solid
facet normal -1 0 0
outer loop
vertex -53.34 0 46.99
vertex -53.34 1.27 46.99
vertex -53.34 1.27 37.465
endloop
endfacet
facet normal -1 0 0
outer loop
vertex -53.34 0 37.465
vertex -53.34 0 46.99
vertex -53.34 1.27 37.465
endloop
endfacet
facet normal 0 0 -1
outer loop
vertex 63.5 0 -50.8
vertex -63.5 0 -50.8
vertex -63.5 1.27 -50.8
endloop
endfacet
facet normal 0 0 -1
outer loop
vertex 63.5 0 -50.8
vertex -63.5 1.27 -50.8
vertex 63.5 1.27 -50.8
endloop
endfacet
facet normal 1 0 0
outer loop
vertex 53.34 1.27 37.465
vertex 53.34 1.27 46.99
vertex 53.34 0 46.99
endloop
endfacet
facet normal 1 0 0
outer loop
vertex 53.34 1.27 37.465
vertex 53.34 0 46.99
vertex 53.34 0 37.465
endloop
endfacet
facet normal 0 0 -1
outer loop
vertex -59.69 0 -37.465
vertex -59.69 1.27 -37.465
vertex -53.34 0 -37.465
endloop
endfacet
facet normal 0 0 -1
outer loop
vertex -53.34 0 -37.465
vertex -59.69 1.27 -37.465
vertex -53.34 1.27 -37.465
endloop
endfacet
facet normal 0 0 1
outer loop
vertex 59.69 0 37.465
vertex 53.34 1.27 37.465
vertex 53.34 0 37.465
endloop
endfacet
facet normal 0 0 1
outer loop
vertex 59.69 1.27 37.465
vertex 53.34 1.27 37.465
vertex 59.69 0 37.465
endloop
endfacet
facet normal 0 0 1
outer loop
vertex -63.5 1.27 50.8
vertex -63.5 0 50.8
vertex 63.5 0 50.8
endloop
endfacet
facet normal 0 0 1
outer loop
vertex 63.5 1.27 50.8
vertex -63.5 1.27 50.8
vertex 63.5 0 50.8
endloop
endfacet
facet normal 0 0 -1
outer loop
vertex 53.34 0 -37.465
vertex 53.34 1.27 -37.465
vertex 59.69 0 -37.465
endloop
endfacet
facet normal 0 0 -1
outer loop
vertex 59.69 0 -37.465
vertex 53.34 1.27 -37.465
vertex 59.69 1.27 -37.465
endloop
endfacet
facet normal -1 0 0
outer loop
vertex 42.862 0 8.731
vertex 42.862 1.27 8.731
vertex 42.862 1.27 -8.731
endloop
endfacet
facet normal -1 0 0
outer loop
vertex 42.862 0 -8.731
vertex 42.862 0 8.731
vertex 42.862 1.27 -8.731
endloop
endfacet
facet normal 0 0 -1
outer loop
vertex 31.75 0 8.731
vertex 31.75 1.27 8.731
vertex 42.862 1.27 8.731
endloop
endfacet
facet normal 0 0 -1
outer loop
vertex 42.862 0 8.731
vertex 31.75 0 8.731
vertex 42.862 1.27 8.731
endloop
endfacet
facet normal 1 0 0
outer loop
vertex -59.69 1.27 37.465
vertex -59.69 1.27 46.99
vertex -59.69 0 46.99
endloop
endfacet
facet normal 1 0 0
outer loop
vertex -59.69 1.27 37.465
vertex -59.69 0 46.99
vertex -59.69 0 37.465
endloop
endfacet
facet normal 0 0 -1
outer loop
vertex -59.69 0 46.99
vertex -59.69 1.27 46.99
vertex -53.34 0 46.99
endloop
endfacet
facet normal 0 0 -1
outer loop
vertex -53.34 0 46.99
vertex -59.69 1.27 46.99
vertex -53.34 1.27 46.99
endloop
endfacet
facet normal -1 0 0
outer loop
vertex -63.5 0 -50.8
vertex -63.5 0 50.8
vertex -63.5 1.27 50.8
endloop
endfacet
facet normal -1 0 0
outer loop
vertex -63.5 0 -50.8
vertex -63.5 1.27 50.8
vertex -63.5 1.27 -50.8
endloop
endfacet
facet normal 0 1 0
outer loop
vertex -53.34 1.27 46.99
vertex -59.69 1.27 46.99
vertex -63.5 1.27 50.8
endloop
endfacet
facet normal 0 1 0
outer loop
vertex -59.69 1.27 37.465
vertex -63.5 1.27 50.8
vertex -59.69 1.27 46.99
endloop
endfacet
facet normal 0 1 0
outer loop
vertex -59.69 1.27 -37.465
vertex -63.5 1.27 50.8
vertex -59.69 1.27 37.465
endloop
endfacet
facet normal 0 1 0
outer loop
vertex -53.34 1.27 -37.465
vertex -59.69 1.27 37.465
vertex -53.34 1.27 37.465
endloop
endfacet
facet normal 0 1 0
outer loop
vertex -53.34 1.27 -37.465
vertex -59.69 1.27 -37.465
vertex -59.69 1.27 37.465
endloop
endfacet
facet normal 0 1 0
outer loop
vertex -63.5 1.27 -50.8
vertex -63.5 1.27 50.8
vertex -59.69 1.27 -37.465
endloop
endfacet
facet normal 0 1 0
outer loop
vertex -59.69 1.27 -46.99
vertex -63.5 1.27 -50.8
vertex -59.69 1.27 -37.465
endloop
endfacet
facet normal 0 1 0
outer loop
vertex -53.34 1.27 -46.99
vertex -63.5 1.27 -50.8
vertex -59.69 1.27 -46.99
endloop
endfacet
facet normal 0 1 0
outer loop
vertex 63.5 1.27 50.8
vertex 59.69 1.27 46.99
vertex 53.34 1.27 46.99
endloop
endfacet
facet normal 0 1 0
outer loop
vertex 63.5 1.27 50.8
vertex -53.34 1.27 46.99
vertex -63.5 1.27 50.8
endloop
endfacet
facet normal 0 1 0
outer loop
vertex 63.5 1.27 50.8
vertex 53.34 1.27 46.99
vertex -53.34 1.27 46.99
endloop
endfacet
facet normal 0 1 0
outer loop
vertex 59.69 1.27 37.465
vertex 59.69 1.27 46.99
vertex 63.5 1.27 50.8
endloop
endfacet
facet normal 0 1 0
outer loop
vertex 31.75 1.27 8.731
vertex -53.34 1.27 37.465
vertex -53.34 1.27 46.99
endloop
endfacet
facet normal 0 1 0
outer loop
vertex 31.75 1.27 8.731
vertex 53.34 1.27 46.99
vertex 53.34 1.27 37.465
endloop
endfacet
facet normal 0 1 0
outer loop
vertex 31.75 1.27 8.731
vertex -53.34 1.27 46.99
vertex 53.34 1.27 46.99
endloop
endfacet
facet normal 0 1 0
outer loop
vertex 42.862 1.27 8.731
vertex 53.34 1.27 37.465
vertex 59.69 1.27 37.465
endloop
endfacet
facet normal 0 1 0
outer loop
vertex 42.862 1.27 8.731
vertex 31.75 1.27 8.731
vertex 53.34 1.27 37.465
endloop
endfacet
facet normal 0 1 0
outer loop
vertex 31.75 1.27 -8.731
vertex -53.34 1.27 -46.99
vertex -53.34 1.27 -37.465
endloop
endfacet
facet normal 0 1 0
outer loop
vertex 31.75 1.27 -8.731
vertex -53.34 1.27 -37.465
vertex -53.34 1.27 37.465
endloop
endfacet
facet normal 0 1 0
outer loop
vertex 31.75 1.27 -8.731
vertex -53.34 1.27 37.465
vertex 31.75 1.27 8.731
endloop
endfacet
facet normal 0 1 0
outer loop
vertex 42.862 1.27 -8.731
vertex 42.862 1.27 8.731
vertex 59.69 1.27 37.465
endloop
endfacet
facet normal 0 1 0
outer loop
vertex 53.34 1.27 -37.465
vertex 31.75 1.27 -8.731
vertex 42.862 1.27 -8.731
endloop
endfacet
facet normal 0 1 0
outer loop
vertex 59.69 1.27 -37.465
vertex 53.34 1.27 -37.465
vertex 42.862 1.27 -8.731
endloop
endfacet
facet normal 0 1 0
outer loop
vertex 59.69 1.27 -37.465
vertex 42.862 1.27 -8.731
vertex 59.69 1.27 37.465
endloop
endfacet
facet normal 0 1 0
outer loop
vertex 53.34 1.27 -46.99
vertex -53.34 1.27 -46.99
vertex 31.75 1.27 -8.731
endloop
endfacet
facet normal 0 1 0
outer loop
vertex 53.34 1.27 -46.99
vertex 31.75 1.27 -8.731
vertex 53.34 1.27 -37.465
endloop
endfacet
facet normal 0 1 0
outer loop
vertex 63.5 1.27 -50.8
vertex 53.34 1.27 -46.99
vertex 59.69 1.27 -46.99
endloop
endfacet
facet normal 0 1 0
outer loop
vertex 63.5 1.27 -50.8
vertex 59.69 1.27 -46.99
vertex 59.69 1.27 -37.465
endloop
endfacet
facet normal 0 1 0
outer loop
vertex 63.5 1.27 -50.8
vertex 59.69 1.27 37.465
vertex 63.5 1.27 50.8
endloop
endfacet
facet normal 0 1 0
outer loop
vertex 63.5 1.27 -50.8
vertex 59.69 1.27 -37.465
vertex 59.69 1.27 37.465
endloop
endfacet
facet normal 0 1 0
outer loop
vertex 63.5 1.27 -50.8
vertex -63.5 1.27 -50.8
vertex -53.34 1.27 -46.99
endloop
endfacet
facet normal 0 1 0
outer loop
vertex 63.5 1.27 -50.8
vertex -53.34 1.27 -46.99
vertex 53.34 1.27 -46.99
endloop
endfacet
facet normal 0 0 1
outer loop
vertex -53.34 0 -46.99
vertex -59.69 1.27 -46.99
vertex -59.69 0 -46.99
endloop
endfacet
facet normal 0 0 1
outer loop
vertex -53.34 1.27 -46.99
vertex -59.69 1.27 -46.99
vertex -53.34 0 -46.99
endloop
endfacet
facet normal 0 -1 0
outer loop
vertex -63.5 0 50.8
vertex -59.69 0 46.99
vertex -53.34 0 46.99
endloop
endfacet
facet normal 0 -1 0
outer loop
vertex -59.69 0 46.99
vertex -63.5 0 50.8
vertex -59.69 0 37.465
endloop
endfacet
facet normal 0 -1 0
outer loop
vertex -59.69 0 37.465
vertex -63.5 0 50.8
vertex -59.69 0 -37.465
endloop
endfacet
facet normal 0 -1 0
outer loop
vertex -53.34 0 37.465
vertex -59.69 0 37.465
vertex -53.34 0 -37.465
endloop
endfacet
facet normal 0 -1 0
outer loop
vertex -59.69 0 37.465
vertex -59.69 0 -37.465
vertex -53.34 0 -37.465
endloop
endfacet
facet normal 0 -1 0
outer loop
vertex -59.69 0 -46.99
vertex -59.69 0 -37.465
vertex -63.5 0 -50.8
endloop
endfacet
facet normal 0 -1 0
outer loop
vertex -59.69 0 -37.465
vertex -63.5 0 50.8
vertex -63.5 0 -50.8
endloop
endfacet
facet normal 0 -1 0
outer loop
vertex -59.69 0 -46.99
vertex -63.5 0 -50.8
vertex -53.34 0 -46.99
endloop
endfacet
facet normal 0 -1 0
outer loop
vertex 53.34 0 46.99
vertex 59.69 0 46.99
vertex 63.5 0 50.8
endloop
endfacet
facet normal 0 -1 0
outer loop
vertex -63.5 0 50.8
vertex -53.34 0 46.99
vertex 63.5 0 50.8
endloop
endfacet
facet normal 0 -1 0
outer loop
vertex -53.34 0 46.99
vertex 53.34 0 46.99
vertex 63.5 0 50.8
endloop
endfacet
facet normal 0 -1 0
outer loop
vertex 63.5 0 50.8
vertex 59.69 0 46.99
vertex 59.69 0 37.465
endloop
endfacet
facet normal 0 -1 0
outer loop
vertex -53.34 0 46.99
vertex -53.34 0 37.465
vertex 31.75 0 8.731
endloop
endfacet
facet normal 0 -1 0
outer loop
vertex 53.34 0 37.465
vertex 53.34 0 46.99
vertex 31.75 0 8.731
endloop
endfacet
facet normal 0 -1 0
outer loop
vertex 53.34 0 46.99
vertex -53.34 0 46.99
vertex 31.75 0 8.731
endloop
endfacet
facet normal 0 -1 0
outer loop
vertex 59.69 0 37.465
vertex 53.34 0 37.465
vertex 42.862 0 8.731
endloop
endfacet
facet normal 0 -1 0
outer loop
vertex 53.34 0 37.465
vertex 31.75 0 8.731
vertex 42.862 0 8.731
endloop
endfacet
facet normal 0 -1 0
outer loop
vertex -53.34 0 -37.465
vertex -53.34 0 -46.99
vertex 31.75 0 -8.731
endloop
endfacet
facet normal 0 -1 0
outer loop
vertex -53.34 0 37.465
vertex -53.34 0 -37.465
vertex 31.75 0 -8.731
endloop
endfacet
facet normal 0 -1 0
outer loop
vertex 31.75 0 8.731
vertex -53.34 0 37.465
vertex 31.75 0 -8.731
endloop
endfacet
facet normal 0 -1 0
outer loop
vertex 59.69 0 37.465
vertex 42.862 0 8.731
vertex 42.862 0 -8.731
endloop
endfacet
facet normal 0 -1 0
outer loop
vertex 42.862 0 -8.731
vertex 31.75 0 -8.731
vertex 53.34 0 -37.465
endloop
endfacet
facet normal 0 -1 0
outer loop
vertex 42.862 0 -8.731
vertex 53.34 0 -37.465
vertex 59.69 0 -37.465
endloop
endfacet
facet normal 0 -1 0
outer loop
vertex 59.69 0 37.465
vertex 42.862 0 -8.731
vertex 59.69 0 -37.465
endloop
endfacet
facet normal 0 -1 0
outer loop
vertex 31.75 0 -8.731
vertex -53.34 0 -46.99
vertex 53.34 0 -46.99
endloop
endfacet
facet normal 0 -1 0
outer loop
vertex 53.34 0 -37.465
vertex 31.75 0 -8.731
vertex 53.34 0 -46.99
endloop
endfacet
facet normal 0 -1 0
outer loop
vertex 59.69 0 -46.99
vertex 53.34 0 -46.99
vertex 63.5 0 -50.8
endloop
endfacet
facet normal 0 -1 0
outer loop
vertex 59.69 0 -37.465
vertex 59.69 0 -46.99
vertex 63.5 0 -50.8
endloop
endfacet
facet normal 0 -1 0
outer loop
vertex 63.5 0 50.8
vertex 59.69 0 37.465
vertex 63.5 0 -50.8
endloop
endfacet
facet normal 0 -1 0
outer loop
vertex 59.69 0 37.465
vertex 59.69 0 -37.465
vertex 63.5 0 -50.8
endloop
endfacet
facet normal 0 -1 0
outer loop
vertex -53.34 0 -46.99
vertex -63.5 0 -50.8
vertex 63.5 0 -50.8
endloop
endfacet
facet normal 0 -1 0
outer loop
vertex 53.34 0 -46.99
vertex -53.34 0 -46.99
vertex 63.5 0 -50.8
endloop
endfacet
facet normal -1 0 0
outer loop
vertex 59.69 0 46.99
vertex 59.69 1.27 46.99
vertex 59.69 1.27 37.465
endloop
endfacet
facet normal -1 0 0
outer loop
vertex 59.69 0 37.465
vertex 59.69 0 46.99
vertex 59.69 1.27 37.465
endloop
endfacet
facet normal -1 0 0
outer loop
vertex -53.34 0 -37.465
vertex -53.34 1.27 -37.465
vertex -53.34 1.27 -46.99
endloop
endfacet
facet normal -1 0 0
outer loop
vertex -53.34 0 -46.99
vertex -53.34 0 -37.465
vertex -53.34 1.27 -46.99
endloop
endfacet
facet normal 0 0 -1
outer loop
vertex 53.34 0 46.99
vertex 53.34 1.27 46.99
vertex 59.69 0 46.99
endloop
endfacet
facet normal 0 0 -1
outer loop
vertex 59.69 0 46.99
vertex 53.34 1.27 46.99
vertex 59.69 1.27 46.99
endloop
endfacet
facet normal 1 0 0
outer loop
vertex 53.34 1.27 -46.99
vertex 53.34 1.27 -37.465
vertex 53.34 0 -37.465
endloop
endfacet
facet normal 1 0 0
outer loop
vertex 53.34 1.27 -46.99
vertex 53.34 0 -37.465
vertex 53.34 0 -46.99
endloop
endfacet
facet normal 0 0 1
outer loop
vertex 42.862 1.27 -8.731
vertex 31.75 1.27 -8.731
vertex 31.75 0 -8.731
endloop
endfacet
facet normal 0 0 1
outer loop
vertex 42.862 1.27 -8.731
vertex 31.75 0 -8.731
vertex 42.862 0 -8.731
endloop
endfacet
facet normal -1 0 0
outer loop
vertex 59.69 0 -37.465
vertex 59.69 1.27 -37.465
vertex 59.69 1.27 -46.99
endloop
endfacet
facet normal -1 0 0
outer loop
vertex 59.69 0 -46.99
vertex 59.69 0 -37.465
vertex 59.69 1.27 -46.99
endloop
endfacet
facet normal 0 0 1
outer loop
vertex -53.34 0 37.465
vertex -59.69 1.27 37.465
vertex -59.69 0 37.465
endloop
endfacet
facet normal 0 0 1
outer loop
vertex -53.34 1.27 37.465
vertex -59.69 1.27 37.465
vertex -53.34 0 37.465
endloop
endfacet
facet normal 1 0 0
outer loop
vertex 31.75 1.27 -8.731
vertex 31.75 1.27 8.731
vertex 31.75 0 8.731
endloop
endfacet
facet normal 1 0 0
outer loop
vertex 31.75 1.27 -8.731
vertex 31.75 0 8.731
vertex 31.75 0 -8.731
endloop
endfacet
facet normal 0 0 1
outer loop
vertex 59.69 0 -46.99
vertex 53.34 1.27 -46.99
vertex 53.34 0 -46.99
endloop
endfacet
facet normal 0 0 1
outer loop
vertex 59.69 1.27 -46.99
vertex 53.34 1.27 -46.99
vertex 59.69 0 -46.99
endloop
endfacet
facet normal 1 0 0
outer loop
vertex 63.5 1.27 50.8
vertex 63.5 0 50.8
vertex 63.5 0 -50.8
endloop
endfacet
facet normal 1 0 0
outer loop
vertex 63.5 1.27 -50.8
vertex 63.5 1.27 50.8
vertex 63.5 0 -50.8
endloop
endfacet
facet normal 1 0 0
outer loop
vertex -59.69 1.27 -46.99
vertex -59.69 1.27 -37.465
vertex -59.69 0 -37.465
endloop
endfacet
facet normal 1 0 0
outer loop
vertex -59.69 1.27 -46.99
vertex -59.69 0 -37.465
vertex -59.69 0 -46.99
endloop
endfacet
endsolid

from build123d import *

# Parameters (mm, degrees)
SKETCH1_W           = 127
SKETCH1_H           = 101.6
BOSS_EXTRUDE1_DEPTH = 1.27
CUT_EXTRUDE1_REACH  = 83.33
SKETCH2_W           = 6.35
SKETCH2_H           = 9.525
CUT_EXTRUDE2_REACH  = 83.33
SKETCH3_W           = 11.1125
SKETCH3_H           = 17.4625


with BuildPart() as part:
    # Sketch1 → Boss-Extrude1 (new body)
    with BuildSketch(Plane(origin=(0, 0, 0), x_dir=(1, 0, 0), z_dir=(0, 1, 0))):
        Rectangle(SKETCH1_W, SKETCH1_H)
    extrude(amount=BOSS_EXTRUDE1_DEPTH)

    # Sketch2 → Cut-Extrude1 (cut, up to next)
    with BuildSketch(Plane(origin=(0, 1.27, 0), x_dir=(1, 0, 0), z_dir=(0, 1, 0)), mode=Mode.PRIVATE) as cut_extrude1_sk1:
        with Locations((-56.515, 42.2275)):
            Rectangle(SKETCH2_W, SKETCH2_H)
    cut_extrude1_tool1 = extrude(cut_extrude1_sk1.sketch, amount=-CUT_EXTRUDE1_REACH, mode=Mode.PRIVATE) & part.part
    # Sketch2 → Cut-Extrude1 (cut, up to next)
    with BuildSketch(Plane(origin=(0, 1.27, 0), x_dir=(1, 0, 0), z_dir=(0, 1, 0)), mode=Mode.PRIVATE) as cut_extrude1_sk2:
        with Locations((56.515, 42.2275)):
            Rectangle(SKETCH2_W, SKETCH2_H)
    cut_extrude1_tool2 = extrude(cut_extrude1_sk2.sketch, amount=-CUT_EXTRUDE1_REACH, mode=Mode.PRIVATE) & part.part
    # Sketch2 → Cut-Extrude1 (cut, up to next)
    with BuildSketch(Plane(origin=(0, 1.27, 0), x_dir=(1, 0, 0), z_dir=(0, 1, 0)), mode=Mode.PRIVATE) as cut_extrude1_sk3:
        with Locations((56.515, -42.2275)):
            Rectangle(SKETCH2_W, SKETCH2_H)
    cut_extrude1_tool3 = extrude(cut_extrude1_sk3.sketch, amount=-CUT_EXTRUDE1_REACH, mode=Mode.PRIVATE) & part.part
    # Sketch2 → Cut-Extrude1 (cut, up to next)
    with BuildSketch(Plane(origin=(0, 1.27, 0), x_dir=(1, 0, 0), z_dir=(0, 1, 0)), mode=Mode.PRIVATE) as cut_extrude1_sk4:
        with Locations((-56.515, -42.2275)):
            Rectangle(SKETCH2_W, SKETCH2_H)
    cut_extrude1_tool4 = extrude(cut_extrude1_sk4.sketch, amount=-CUT_EXTRUDE1_REACH, mode=Mode.PRIVATE) & part.part
    add(cut_extrude1_tool1.solids().sort_by_distance((-56.515, 1.27, -42.2275))[0], mode=Mode.SUBTRACT)
    add(cut_extrude1_tool2.solids().sort_by_distance((56.515, 1.27, -42.2275))[0], mode=Mode.SUBTRACT)
    add(cut_extrude1_tool3.solids().sort_by_distance((56.515, 1.27, 42.2275))[0], mode=Mode.SUBTRACT)
    add(cut_extrude1_tool4.solids().sort_by_distance((-56.515, 1.27, 42.2275))[0], mode=Mode.SUBTRACT)

    # Sketch3 → Cut-Extrude2 (cut, up to next)
    with BuildSketch(Plane(origin=(0, 1.27, 0), x_dir=(1, 0, 0), z_dir=(0, 1, 0)), mode=Mode.PRIVATE) as cut_extrude2_sk1:
        with Locations((37.30625, 0)):
            Rectangle(SKETCH3_W, SKETCH3_H)
    cut_extrude2_tool1 = extrude(cut_extrude2_sk1.sketch, amount=-CUT_EXTRUDE2_REACH, mode=Mode.PRIVATE) & part.part
    add(cut_extrude2_tool1.solids().sort_by_distance((37.30625, 1.27, 0))[0], mode=Mode.SUBTRACT)


solid = part.part
